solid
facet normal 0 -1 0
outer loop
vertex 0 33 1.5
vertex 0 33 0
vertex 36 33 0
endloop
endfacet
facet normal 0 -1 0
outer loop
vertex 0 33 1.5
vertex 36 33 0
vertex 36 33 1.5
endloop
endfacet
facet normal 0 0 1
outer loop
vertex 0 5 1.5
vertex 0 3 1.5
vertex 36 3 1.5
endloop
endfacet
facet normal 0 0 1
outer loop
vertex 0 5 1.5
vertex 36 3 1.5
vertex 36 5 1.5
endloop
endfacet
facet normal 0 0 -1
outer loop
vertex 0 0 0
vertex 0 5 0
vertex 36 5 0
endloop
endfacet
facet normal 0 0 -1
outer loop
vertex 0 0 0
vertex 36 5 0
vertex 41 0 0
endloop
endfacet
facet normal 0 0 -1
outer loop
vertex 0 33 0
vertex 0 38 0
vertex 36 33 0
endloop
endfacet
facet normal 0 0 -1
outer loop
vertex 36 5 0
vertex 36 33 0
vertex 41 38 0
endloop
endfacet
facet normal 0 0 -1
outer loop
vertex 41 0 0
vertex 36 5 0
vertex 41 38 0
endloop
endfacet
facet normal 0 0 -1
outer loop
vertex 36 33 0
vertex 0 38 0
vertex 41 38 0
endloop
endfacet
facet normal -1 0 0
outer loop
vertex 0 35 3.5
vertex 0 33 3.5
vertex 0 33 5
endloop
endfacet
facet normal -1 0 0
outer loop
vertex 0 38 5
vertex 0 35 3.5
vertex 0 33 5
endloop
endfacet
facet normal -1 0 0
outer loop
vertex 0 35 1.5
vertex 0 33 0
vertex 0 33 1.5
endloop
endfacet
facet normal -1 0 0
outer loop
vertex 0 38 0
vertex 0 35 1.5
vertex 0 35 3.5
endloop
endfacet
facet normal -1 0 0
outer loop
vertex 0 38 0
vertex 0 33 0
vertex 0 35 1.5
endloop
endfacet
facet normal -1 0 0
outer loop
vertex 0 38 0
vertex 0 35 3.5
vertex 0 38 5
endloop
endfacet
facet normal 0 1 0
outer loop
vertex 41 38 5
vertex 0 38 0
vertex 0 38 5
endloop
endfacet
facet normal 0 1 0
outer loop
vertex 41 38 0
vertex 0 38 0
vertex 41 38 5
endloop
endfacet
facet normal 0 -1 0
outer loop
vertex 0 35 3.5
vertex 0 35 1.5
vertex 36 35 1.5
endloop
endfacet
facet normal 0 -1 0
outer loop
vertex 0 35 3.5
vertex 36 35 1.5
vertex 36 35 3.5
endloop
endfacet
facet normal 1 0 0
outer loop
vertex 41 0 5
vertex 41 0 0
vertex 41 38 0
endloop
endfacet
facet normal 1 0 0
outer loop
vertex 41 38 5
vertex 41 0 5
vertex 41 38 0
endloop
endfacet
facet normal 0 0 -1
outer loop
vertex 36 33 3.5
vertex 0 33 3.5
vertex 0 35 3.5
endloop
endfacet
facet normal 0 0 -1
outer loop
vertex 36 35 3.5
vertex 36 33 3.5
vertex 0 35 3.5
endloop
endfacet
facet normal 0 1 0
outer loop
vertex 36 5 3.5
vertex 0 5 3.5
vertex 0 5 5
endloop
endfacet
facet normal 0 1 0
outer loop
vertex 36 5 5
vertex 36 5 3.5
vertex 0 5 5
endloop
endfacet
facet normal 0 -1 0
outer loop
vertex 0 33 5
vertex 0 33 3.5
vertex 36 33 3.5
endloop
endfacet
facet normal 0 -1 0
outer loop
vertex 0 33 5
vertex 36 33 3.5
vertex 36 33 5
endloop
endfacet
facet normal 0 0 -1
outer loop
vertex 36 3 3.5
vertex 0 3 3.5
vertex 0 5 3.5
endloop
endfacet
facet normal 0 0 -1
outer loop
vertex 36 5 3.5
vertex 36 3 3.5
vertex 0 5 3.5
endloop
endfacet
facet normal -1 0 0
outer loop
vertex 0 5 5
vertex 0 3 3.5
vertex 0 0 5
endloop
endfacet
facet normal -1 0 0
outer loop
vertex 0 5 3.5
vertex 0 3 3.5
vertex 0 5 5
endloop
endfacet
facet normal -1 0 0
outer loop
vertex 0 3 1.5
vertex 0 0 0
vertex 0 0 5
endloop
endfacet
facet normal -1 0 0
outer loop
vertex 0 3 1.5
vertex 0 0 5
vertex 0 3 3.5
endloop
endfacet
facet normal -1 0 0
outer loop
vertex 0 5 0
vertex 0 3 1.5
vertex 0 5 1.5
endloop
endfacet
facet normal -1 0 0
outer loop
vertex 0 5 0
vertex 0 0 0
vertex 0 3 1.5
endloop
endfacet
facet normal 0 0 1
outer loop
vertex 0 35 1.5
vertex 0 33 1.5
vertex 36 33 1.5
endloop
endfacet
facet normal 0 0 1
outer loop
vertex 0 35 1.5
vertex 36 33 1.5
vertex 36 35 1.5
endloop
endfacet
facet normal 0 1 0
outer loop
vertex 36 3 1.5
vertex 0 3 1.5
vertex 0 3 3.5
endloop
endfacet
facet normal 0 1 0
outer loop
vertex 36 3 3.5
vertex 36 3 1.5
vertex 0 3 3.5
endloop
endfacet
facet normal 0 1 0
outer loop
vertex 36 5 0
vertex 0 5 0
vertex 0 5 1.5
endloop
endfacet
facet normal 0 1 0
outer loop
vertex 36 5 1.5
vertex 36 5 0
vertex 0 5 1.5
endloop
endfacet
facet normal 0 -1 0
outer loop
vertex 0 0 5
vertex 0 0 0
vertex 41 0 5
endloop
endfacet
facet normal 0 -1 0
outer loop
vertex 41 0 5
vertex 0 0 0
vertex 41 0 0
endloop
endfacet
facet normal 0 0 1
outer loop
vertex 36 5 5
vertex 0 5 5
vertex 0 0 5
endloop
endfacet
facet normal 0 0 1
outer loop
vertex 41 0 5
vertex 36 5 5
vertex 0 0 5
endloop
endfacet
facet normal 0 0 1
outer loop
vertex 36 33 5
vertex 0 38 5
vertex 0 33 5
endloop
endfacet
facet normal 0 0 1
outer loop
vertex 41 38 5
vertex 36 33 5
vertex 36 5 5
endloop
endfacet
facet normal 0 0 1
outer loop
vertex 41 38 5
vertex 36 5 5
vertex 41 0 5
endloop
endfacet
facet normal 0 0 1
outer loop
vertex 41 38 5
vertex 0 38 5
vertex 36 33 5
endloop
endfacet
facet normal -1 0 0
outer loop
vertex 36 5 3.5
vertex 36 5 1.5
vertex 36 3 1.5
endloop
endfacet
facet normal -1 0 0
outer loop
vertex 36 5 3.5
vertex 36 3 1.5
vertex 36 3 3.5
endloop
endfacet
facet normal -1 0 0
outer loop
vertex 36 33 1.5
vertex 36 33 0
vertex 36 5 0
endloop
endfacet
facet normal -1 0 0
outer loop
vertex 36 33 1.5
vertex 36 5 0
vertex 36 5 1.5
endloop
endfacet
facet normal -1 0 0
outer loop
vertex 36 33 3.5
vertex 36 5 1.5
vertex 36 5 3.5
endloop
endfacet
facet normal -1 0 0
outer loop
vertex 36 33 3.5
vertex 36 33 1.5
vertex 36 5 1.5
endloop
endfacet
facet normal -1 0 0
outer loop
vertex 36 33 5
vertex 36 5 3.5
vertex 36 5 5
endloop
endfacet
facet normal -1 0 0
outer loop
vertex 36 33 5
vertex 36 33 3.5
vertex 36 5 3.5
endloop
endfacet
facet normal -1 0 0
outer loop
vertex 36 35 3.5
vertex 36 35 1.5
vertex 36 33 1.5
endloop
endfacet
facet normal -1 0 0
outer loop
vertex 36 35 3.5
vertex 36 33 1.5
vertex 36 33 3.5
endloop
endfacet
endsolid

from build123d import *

# Parameters (mm, degrees)
ESQUISSE1_W             = 41
ESQUISSE1_H             = 38
BOSS_EXTRU_1_DEPTH      = 5
ESQUISSE6_W             = 36
ESQUISSE6_H             = 21
ENL_V_MAT_EXTRU_3_DEPTH = 5
ESQUISSE7_W             = 2
ESQUISSE7_H             = 32
ENL_V_MAT_EXTRU_4_DEPTH = 36
ESQUISSE8_W             = 5
ESQUISSE8_H             = 28
ENL_V_MAT_EXTRU_5_DEPTH = 36


with BuildPart() as part:
    # Esquisse1 → Boss.-Extru.1 (new body)
    with BuildSketch(Plane.XY):
        with Locations((20.5, 19)):
            Rectangle(ESQUISSE1_W, ESQUISSE1_H)
    extrude(amount=BOSS_EXTRU_1_DEPTH)

    # Esquisse6 → Enlèv. mat.-Extru.3 (cut)
    with BuildSketch(Plane(origin=(0, 0, 0), x_dir=(-1, 0, 0), z_dir=(0, 0, -1))):
        with Locations((-18, 19)):
            Rectangle(ESQUISSE6_W, ESQUISSE6_H)
    extrude(amount=-ENL_V_MAT_EXTRU_3_DEPTH, mode=Mode.SUBTRACT)

    # Esquisse7 → Enlèv. mat.-Extru.4 (cut)
    with BuildSketch(Plane.ZY):
        with Locations((2.5, 19)):
            Rectangle(ESQUISSE7_W, ESQUISSE7_H)
    extrude(amount=-ENL_V_MAT_EXTRU_4_DEPTH, mode=Mode.SUBTRACT)

    # Esquisse8 → Enlèv. mat.-Extru.5 (cut)
    with BuildSketch(Plane.ZY):
        with Locations((2.5, 19)):
            Rectangle(ESQUISSE8_W, ESQUISSE8_H)
    extrude(amount=-ENL_V_MAT_EXTRU_5_DEPTH, mode=Mode.SUBTRACT)


solid = part.part
